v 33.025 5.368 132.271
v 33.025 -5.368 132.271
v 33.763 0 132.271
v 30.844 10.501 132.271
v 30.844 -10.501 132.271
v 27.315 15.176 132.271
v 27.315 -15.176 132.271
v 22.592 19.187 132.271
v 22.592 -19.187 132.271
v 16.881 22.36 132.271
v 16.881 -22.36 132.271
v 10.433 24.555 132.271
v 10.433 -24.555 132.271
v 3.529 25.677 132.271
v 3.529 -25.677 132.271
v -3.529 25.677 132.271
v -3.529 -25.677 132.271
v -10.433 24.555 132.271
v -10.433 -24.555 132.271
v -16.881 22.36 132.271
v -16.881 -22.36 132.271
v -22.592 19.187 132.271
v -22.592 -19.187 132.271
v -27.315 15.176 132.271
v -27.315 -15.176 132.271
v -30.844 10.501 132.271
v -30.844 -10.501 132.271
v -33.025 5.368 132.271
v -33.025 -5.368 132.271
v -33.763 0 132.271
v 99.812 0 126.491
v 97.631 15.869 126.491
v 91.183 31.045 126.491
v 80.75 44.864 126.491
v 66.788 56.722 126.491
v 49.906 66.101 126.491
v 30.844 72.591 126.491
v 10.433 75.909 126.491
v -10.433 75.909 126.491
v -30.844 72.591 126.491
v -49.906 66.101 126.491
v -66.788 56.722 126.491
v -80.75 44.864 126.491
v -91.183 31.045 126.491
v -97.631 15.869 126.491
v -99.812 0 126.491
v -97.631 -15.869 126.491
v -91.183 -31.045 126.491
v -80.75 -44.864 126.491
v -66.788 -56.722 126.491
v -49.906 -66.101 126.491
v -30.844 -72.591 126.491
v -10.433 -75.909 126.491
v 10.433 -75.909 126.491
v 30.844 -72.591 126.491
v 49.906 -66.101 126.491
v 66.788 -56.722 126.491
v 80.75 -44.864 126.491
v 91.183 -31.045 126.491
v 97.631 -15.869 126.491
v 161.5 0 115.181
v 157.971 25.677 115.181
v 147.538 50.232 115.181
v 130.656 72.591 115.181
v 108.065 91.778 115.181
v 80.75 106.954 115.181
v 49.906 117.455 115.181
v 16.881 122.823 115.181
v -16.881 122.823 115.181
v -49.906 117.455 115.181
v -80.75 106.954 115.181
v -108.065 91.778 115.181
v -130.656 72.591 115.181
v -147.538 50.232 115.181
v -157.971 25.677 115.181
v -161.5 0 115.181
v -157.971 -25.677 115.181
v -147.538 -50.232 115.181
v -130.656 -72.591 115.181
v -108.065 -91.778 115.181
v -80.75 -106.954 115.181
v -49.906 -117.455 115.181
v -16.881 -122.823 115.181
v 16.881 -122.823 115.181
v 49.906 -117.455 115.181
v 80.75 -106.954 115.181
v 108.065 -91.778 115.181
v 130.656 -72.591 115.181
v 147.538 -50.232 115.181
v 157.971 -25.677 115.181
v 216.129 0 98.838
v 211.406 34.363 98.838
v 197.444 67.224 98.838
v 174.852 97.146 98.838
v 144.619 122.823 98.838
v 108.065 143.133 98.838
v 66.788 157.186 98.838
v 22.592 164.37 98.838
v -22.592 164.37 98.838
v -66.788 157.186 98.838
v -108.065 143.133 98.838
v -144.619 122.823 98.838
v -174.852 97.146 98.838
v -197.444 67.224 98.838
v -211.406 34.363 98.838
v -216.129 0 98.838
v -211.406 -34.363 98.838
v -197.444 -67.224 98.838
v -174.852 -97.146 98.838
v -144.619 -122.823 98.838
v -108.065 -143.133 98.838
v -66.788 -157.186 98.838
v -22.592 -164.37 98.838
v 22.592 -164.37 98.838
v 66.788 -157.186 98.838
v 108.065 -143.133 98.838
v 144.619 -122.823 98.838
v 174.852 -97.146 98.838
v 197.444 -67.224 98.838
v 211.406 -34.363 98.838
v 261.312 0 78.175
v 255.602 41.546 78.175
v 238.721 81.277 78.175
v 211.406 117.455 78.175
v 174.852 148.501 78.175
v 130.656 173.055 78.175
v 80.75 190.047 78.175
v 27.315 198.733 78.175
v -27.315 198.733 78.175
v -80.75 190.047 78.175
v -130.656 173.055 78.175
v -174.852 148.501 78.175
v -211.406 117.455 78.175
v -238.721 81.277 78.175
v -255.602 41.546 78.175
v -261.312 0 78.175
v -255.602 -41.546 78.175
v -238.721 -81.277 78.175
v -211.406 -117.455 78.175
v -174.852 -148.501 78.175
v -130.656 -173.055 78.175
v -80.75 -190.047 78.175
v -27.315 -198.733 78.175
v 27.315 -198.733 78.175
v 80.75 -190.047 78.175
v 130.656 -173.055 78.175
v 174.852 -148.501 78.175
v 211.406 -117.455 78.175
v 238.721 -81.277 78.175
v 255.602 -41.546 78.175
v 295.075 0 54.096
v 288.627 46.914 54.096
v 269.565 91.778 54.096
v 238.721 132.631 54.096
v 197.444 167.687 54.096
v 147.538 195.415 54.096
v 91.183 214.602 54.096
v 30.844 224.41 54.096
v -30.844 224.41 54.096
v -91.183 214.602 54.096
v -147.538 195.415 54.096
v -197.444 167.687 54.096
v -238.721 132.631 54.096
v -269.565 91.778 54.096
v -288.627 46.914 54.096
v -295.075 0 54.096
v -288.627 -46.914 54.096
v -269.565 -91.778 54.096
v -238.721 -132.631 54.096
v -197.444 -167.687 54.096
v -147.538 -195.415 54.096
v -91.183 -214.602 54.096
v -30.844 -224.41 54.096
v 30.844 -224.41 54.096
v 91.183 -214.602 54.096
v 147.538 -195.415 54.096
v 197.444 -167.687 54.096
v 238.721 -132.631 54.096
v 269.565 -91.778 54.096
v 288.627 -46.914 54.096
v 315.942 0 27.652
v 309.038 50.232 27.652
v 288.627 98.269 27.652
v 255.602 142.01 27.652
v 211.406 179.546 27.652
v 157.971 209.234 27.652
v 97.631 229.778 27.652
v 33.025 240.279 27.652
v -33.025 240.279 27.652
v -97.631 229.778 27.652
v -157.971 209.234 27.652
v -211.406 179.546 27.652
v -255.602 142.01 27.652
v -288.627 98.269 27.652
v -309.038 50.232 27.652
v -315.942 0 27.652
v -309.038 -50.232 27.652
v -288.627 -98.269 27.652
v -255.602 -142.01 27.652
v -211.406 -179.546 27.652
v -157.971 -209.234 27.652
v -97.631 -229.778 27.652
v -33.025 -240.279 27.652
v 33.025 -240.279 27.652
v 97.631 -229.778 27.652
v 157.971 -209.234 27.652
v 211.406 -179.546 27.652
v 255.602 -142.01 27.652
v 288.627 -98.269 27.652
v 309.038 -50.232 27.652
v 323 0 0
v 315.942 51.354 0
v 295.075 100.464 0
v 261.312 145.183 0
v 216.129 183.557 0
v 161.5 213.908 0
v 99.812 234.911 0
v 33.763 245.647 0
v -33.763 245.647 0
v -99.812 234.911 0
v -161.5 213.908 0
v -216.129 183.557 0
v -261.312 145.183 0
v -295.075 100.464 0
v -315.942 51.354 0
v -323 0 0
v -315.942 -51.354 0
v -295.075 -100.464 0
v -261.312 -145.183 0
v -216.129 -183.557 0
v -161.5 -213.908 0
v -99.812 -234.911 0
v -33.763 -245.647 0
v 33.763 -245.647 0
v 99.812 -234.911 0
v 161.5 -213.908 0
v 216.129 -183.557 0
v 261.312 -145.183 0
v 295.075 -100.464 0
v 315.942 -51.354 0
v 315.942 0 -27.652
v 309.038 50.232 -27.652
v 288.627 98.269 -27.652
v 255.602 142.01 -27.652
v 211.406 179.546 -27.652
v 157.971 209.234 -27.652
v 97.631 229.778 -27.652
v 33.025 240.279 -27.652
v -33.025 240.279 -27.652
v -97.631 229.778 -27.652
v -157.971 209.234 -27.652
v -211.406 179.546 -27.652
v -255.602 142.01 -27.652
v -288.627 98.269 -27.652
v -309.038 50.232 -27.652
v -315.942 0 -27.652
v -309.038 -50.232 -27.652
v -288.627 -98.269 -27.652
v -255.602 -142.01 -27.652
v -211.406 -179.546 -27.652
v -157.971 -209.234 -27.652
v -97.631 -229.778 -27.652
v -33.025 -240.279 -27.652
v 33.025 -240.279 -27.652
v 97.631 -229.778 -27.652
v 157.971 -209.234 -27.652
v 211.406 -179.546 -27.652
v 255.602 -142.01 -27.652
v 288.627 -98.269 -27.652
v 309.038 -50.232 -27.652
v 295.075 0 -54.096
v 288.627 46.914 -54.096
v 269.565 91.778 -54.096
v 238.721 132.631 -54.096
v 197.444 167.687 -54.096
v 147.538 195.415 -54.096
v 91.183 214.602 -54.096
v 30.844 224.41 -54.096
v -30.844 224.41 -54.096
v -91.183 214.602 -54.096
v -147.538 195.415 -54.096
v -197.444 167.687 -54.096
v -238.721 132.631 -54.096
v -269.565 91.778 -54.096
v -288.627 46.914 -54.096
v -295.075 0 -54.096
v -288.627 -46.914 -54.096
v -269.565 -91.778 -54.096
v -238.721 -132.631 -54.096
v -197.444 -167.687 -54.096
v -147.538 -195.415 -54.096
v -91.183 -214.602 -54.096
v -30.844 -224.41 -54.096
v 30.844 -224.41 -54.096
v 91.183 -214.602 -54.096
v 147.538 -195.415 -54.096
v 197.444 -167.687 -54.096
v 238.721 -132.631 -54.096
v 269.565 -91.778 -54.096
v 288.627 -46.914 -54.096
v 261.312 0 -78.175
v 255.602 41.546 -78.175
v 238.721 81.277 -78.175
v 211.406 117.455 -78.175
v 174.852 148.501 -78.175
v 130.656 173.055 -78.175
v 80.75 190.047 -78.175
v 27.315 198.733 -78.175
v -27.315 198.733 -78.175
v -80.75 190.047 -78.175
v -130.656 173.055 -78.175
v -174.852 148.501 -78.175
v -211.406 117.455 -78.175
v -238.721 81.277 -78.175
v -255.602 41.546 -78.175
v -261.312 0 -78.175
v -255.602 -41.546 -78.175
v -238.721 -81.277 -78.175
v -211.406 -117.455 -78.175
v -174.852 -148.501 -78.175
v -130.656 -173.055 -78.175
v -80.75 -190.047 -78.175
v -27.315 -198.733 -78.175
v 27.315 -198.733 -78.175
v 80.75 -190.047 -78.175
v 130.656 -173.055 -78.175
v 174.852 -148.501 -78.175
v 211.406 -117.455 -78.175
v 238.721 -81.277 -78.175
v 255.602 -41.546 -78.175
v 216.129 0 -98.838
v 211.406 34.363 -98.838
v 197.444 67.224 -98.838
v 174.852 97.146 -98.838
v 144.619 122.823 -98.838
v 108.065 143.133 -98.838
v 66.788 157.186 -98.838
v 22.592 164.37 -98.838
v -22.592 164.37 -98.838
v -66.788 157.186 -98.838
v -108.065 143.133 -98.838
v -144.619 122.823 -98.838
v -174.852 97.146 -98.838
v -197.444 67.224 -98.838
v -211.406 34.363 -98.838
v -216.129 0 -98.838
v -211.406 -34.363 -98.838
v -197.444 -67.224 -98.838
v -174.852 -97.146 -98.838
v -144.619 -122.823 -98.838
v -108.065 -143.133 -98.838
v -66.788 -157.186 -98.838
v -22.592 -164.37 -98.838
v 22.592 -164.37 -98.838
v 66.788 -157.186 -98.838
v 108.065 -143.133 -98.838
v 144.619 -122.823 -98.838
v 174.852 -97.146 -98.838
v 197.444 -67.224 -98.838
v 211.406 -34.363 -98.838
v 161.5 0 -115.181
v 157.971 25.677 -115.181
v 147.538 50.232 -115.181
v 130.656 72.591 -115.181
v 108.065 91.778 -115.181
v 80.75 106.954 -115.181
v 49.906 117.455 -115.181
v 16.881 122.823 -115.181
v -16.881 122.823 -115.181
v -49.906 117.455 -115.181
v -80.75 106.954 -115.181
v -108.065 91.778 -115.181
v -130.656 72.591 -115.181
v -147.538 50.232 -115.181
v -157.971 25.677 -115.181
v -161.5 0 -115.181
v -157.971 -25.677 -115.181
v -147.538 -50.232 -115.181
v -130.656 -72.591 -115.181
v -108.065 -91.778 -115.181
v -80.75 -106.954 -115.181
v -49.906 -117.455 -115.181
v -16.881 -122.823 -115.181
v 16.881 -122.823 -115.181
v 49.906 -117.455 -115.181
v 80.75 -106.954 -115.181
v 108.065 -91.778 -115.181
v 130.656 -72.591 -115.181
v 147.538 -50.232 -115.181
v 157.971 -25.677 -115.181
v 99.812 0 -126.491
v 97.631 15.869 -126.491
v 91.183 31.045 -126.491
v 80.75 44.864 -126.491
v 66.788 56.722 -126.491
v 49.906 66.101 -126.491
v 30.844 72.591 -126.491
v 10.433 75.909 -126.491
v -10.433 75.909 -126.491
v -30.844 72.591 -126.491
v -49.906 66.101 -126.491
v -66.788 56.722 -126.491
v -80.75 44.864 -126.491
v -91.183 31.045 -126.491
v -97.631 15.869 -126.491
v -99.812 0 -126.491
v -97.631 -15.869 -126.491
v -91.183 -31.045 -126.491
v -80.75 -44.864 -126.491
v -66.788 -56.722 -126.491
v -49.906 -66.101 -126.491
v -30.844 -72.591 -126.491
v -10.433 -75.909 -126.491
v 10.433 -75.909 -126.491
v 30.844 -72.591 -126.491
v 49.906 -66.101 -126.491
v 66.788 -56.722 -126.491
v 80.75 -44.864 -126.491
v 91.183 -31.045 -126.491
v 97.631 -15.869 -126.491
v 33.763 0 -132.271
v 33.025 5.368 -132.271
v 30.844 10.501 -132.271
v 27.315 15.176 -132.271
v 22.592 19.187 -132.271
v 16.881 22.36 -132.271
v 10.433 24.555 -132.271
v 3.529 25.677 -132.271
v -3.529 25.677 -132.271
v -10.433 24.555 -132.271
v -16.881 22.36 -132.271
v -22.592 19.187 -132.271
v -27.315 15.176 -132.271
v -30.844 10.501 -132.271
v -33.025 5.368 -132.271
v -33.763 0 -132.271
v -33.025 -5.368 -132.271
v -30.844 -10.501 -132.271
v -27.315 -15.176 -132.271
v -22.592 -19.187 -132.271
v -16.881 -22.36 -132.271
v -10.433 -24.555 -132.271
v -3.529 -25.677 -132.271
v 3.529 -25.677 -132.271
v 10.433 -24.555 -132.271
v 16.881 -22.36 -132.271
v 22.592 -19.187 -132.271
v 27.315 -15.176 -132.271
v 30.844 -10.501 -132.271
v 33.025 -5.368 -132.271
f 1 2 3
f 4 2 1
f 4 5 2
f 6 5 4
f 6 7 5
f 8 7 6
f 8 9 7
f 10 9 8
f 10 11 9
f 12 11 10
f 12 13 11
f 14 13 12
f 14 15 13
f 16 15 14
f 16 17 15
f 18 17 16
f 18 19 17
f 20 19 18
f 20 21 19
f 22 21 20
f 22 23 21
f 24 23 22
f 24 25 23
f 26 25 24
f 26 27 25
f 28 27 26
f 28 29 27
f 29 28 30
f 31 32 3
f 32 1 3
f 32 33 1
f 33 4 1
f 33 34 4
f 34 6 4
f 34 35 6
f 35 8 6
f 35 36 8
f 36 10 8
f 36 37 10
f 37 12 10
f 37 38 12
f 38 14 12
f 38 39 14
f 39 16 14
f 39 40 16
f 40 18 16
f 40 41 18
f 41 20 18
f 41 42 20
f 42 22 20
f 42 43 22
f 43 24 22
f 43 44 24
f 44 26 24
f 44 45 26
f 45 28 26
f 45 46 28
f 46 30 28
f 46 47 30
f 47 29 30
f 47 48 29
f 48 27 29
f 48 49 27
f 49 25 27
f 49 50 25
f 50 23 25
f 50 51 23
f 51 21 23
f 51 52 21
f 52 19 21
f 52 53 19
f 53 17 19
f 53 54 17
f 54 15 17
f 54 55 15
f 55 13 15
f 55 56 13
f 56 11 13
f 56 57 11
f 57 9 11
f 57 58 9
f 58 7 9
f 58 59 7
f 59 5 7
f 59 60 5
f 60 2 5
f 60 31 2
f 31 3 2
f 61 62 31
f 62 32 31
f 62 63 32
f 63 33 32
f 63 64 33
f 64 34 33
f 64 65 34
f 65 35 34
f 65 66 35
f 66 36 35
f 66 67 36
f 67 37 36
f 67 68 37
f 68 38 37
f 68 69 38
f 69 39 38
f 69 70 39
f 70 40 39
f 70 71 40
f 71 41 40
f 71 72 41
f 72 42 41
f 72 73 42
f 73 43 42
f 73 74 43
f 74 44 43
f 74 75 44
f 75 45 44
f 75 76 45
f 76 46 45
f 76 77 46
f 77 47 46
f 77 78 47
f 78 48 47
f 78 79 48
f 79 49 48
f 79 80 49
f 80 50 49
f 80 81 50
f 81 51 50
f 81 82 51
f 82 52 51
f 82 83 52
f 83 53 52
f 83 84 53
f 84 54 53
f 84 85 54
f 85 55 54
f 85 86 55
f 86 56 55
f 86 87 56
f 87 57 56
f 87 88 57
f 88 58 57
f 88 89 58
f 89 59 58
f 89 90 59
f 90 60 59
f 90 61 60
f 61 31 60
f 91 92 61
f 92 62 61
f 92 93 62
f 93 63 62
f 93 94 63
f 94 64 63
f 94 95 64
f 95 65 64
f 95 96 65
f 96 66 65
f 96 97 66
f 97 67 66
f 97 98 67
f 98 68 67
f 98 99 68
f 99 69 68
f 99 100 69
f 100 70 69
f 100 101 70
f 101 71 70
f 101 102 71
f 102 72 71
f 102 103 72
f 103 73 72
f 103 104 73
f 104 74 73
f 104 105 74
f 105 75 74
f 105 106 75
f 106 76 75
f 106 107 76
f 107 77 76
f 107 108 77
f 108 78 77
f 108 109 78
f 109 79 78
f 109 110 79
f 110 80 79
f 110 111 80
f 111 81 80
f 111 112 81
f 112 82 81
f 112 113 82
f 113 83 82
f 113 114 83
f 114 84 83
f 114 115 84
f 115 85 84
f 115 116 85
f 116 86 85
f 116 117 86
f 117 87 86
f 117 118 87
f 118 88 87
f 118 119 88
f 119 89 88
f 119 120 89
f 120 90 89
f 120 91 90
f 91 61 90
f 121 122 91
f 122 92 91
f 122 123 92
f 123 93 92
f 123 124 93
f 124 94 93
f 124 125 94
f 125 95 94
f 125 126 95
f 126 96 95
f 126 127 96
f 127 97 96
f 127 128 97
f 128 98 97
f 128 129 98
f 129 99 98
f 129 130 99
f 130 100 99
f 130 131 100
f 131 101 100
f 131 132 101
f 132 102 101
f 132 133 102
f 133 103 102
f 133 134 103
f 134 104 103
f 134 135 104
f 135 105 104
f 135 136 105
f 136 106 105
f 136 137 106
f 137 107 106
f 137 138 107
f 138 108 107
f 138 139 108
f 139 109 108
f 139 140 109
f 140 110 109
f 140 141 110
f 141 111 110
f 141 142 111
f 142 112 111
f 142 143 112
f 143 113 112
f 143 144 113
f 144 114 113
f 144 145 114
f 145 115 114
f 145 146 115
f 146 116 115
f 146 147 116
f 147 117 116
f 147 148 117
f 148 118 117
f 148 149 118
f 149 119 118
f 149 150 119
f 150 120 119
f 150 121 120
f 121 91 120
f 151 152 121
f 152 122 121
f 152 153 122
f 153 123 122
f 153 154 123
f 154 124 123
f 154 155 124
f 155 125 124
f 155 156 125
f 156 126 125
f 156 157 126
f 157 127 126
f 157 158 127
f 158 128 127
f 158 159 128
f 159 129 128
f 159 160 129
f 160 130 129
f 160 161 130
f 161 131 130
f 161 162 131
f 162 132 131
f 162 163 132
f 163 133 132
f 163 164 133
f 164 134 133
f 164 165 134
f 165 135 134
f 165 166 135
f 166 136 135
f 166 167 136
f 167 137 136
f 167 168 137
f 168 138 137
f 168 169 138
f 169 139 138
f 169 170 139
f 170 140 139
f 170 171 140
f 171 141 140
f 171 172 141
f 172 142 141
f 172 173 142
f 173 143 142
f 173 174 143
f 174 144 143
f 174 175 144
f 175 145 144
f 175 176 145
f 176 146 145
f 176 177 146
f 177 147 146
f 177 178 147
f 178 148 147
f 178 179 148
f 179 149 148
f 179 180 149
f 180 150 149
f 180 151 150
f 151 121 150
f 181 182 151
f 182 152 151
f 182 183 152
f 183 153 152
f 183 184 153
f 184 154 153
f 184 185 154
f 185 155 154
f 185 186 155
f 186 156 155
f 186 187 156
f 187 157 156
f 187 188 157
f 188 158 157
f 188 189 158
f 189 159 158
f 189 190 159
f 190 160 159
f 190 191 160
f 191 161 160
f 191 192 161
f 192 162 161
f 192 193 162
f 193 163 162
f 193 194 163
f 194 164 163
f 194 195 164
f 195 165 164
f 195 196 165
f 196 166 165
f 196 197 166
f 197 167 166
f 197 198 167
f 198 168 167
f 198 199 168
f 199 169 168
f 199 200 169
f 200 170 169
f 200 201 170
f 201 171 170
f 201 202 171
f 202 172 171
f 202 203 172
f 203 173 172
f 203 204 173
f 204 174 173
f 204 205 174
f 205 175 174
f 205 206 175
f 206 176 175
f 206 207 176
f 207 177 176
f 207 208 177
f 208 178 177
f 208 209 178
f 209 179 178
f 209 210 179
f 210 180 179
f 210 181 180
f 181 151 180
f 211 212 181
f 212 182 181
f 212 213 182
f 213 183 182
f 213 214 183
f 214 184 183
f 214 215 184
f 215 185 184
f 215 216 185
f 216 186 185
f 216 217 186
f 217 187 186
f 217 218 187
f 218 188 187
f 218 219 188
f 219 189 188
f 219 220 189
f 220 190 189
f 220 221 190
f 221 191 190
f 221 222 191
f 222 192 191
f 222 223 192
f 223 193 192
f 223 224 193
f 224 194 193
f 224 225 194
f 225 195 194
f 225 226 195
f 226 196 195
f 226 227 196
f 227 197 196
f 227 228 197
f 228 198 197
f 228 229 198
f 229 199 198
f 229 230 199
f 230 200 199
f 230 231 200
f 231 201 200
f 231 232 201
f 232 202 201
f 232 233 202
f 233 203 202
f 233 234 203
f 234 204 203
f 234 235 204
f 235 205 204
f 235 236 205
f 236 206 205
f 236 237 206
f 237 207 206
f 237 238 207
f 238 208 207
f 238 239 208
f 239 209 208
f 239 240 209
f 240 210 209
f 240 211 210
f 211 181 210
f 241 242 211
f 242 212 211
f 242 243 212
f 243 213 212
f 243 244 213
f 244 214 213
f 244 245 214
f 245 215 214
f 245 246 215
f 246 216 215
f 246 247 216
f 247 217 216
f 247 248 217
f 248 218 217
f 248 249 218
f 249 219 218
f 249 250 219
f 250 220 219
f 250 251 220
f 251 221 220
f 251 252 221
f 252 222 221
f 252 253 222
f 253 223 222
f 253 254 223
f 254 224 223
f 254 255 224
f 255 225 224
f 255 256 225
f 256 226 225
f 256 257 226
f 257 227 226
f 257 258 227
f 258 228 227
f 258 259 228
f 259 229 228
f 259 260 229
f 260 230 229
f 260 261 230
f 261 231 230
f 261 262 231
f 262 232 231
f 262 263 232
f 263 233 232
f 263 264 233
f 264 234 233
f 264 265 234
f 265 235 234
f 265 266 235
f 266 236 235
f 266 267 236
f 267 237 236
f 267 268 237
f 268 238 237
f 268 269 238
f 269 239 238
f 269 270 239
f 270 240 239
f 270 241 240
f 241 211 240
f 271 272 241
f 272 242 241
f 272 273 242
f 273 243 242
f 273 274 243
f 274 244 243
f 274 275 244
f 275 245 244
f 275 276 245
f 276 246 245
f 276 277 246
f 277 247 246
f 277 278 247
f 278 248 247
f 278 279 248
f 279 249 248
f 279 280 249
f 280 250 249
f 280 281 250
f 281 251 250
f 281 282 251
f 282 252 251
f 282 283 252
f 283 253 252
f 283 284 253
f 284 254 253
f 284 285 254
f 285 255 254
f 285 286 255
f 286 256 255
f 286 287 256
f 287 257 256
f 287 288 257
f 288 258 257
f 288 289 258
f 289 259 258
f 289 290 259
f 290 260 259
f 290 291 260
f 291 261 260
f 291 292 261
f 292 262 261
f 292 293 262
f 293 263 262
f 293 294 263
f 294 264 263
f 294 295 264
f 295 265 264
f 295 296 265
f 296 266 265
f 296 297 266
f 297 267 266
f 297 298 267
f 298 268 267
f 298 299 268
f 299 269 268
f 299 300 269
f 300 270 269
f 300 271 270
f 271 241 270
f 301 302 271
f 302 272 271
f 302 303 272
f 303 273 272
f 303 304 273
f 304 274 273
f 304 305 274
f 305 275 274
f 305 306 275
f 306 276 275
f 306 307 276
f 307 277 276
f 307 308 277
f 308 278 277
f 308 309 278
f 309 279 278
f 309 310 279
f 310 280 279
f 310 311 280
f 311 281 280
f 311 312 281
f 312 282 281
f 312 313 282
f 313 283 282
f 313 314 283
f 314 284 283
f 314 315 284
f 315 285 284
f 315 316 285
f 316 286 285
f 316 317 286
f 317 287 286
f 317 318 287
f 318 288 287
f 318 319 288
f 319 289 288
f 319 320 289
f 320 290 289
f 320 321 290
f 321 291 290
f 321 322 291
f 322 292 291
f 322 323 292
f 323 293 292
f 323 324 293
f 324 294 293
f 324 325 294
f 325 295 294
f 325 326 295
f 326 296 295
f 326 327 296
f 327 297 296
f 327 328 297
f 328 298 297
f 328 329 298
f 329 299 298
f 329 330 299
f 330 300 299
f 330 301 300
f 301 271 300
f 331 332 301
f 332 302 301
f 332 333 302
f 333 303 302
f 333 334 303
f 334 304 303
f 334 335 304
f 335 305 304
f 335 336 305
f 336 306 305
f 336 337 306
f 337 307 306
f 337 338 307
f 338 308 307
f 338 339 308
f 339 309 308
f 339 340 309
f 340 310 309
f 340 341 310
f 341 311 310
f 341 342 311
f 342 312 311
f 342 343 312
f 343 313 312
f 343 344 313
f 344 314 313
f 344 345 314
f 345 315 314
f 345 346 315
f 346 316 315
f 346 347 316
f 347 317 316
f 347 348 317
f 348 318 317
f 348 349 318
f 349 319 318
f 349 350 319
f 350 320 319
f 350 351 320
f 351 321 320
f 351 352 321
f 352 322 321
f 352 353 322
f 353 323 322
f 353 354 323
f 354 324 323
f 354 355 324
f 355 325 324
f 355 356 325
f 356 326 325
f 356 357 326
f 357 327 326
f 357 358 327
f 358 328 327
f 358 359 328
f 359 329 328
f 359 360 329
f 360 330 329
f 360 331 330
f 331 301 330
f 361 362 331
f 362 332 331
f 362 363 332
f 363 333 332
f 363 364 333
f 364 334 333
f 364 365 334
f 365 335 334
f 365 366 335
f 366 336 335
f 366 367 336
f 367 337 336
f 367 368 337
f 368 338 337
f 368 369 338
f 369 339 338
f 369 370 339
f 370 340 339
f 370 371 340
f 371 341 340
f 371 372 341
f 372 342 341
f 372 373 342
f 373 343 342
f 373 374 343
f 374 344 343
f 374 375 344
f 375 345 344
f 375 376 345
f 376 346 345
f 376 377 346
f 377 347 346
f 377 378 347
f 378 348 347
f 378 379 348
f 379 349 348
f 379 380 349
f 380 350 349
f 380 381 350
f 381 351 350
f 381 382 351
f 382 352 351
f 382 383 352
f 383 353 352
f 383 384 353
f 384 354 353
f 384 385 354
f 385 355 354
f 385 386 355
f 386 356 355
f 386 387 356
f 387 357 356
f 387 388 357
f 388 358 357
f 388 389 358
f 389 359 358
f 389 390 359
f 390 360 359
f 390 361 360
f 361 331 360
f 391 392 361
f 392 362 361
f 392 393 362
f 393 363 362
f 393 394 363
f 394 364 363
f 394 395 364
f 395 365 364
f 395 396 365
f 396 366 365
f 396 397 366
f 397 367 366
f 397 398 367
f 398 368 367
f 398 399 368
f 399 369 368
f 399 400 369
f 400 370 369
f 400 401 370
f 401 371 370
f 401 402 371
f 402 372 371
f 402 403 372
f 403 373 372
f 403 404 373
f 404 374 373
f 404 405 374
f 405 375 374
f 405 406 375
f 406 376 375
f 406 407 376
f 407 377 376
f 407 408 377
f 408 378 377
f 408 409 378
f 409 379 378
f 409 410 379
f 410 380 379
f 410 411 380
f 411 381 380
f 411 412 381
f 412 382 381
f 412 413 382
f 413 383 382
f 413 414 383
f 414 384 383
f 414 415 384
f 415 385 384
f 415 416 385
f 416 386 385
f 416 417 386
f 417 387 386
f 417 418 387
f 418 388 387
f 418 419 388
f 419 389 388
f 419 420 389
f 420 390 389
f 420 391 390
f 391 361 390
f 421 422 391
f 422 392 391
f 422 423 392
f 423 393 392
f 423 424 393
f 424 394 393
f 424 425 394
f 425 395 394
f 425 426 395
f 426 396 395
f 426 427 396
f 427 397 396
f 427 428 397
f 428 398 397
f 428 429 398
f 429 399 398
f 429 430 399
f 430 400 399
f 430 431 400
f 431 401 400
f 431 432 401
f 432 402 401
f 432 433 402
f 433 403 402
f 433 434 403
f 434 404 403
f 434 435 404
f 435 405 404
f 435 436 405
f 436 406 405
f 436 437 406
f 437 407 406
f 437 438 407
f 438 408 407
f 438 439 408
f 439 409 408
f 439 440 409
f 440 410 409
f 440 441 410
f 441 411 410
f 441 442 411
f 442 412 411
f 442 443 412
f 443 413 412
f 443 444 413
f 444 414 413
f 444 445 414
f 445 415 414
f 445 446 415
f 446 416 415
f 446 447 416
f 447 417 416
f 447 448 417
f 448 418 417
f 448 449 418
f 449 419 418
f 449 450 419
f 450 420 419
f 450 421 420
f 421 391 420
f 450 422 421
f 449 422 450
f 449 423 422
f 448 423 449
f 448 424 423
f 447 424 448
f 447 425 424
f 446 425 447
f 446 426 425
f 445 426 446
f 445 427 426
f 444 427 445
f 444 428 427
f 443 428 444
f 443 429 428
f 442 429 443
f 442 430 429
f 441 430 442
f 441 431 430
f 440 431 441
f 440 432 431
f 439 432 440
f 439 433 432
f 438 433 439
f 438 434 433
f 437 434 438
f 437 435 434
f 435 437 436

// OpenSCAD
// Generated by SolidPython 1.0.1 on 2020-07-29 00:46:53


scale(v = [17, 13, 7]) {
	sphere(r = 19);
}
/***********************************************
*********      SolidPython code:      **********
************************************************
 
# import packages: SolidPython
from solid import *
from solid.utils import *
from itertools import chain, combinations, permutations


class Resize:

    def __init__(self, scad_file):
        self.scad_file = scad_file
        #self.scad_file = import_scad(scad_file)
        # cone/cylinder param:
        self.r1 = 0
        self.r2 = 0
        self.h = 0
        # rectangular prism param:
        self.w = 0
        self.l = 0
        # ellipse param:
        self.r = 0

    # import OpenScad code (file name corresponds to shape)


    # classify shape + parameters
    def assign(self, param1, param2, param3):
        if self.scad_file == 'cone.scad':
            self.r1 = param1
            self.r2 = param2
            self.h = param3
        elif self.scad_file == 'cylinder.scad':
            self.r1 = param1
            self.r2 = param2
            self.h = param3
        elif self.scad_file == 'rectangularPrism.scad':
            self.h = param1
            self.l = param2
            self.w = param3
        else:
            self.r = param1
            self.h = param2

    # resize parameters
    def iterate(self):
        x = range(3, 20, 2)
        i = 1
        if self.scad_file == 'cone.scad':
            tempList = list(permutations(x, 2))
            for temp in tempList:
                param1 = temp[0]
                param2 = temp[1]
                filepath = 'produced_scad_files/' + 'cone' + str(param1) + '_' + str(param2) + '_' + '.scad'
                scad_render_to_file(cylinder(h=param1, r1=param2, r2=0), filepath)

        elif self.scad_file == 'cylinder.scad':
            tempList = list(permutations(x, 3))
            for temp in tempList:
                param1 = temp[0]
                param2 = temp[1]
                filepath = 'produced_scad_files/' + 'cylinder' + str(param1) + '_' + str(param2) + '_' + '.scad'
                scad_render_to_file(cylinder(h=param1, r1=param2, r2=param2), filepath)

        elif self.scad_file == 'rectangularPrism.scad':
            tempList = list(permutations(x, 3))
            for temp in tempList:
                param1 = temp[0]
                param2 = temp[1]
                param3 = temp[2]
                filepath = 'produced_scad_files/' + 'rectangularPrism' + str(param1) + '_' + str(param2) + '_' + str(
                    param3) + '.scad'
                scad_render_to_file(cube(size=(param1, param2, param3)), filepath)

        elif self.scad_file == 'ellipse.scad':
            tempList = list(permutations(x, 4))
            for temp in tempList:
                param1 = temp[0]
                param2 = temp[1]
                param3 = temp[2]
                param4 = temp[3]
                filepath = 'produced_scad_files/' + 'ellipse' + str(param1) + '_' + str(param2) + '_' + str(param3) + '_' + str(param4) + '.scad'
                scad_render_to_file(scale([param1, param2, param3])(sphere(r=param4)), filepath)

    def render_to_scadfile(self):
        scad_render_to_file(scad, 'example.scad') 
 
************************************************/
